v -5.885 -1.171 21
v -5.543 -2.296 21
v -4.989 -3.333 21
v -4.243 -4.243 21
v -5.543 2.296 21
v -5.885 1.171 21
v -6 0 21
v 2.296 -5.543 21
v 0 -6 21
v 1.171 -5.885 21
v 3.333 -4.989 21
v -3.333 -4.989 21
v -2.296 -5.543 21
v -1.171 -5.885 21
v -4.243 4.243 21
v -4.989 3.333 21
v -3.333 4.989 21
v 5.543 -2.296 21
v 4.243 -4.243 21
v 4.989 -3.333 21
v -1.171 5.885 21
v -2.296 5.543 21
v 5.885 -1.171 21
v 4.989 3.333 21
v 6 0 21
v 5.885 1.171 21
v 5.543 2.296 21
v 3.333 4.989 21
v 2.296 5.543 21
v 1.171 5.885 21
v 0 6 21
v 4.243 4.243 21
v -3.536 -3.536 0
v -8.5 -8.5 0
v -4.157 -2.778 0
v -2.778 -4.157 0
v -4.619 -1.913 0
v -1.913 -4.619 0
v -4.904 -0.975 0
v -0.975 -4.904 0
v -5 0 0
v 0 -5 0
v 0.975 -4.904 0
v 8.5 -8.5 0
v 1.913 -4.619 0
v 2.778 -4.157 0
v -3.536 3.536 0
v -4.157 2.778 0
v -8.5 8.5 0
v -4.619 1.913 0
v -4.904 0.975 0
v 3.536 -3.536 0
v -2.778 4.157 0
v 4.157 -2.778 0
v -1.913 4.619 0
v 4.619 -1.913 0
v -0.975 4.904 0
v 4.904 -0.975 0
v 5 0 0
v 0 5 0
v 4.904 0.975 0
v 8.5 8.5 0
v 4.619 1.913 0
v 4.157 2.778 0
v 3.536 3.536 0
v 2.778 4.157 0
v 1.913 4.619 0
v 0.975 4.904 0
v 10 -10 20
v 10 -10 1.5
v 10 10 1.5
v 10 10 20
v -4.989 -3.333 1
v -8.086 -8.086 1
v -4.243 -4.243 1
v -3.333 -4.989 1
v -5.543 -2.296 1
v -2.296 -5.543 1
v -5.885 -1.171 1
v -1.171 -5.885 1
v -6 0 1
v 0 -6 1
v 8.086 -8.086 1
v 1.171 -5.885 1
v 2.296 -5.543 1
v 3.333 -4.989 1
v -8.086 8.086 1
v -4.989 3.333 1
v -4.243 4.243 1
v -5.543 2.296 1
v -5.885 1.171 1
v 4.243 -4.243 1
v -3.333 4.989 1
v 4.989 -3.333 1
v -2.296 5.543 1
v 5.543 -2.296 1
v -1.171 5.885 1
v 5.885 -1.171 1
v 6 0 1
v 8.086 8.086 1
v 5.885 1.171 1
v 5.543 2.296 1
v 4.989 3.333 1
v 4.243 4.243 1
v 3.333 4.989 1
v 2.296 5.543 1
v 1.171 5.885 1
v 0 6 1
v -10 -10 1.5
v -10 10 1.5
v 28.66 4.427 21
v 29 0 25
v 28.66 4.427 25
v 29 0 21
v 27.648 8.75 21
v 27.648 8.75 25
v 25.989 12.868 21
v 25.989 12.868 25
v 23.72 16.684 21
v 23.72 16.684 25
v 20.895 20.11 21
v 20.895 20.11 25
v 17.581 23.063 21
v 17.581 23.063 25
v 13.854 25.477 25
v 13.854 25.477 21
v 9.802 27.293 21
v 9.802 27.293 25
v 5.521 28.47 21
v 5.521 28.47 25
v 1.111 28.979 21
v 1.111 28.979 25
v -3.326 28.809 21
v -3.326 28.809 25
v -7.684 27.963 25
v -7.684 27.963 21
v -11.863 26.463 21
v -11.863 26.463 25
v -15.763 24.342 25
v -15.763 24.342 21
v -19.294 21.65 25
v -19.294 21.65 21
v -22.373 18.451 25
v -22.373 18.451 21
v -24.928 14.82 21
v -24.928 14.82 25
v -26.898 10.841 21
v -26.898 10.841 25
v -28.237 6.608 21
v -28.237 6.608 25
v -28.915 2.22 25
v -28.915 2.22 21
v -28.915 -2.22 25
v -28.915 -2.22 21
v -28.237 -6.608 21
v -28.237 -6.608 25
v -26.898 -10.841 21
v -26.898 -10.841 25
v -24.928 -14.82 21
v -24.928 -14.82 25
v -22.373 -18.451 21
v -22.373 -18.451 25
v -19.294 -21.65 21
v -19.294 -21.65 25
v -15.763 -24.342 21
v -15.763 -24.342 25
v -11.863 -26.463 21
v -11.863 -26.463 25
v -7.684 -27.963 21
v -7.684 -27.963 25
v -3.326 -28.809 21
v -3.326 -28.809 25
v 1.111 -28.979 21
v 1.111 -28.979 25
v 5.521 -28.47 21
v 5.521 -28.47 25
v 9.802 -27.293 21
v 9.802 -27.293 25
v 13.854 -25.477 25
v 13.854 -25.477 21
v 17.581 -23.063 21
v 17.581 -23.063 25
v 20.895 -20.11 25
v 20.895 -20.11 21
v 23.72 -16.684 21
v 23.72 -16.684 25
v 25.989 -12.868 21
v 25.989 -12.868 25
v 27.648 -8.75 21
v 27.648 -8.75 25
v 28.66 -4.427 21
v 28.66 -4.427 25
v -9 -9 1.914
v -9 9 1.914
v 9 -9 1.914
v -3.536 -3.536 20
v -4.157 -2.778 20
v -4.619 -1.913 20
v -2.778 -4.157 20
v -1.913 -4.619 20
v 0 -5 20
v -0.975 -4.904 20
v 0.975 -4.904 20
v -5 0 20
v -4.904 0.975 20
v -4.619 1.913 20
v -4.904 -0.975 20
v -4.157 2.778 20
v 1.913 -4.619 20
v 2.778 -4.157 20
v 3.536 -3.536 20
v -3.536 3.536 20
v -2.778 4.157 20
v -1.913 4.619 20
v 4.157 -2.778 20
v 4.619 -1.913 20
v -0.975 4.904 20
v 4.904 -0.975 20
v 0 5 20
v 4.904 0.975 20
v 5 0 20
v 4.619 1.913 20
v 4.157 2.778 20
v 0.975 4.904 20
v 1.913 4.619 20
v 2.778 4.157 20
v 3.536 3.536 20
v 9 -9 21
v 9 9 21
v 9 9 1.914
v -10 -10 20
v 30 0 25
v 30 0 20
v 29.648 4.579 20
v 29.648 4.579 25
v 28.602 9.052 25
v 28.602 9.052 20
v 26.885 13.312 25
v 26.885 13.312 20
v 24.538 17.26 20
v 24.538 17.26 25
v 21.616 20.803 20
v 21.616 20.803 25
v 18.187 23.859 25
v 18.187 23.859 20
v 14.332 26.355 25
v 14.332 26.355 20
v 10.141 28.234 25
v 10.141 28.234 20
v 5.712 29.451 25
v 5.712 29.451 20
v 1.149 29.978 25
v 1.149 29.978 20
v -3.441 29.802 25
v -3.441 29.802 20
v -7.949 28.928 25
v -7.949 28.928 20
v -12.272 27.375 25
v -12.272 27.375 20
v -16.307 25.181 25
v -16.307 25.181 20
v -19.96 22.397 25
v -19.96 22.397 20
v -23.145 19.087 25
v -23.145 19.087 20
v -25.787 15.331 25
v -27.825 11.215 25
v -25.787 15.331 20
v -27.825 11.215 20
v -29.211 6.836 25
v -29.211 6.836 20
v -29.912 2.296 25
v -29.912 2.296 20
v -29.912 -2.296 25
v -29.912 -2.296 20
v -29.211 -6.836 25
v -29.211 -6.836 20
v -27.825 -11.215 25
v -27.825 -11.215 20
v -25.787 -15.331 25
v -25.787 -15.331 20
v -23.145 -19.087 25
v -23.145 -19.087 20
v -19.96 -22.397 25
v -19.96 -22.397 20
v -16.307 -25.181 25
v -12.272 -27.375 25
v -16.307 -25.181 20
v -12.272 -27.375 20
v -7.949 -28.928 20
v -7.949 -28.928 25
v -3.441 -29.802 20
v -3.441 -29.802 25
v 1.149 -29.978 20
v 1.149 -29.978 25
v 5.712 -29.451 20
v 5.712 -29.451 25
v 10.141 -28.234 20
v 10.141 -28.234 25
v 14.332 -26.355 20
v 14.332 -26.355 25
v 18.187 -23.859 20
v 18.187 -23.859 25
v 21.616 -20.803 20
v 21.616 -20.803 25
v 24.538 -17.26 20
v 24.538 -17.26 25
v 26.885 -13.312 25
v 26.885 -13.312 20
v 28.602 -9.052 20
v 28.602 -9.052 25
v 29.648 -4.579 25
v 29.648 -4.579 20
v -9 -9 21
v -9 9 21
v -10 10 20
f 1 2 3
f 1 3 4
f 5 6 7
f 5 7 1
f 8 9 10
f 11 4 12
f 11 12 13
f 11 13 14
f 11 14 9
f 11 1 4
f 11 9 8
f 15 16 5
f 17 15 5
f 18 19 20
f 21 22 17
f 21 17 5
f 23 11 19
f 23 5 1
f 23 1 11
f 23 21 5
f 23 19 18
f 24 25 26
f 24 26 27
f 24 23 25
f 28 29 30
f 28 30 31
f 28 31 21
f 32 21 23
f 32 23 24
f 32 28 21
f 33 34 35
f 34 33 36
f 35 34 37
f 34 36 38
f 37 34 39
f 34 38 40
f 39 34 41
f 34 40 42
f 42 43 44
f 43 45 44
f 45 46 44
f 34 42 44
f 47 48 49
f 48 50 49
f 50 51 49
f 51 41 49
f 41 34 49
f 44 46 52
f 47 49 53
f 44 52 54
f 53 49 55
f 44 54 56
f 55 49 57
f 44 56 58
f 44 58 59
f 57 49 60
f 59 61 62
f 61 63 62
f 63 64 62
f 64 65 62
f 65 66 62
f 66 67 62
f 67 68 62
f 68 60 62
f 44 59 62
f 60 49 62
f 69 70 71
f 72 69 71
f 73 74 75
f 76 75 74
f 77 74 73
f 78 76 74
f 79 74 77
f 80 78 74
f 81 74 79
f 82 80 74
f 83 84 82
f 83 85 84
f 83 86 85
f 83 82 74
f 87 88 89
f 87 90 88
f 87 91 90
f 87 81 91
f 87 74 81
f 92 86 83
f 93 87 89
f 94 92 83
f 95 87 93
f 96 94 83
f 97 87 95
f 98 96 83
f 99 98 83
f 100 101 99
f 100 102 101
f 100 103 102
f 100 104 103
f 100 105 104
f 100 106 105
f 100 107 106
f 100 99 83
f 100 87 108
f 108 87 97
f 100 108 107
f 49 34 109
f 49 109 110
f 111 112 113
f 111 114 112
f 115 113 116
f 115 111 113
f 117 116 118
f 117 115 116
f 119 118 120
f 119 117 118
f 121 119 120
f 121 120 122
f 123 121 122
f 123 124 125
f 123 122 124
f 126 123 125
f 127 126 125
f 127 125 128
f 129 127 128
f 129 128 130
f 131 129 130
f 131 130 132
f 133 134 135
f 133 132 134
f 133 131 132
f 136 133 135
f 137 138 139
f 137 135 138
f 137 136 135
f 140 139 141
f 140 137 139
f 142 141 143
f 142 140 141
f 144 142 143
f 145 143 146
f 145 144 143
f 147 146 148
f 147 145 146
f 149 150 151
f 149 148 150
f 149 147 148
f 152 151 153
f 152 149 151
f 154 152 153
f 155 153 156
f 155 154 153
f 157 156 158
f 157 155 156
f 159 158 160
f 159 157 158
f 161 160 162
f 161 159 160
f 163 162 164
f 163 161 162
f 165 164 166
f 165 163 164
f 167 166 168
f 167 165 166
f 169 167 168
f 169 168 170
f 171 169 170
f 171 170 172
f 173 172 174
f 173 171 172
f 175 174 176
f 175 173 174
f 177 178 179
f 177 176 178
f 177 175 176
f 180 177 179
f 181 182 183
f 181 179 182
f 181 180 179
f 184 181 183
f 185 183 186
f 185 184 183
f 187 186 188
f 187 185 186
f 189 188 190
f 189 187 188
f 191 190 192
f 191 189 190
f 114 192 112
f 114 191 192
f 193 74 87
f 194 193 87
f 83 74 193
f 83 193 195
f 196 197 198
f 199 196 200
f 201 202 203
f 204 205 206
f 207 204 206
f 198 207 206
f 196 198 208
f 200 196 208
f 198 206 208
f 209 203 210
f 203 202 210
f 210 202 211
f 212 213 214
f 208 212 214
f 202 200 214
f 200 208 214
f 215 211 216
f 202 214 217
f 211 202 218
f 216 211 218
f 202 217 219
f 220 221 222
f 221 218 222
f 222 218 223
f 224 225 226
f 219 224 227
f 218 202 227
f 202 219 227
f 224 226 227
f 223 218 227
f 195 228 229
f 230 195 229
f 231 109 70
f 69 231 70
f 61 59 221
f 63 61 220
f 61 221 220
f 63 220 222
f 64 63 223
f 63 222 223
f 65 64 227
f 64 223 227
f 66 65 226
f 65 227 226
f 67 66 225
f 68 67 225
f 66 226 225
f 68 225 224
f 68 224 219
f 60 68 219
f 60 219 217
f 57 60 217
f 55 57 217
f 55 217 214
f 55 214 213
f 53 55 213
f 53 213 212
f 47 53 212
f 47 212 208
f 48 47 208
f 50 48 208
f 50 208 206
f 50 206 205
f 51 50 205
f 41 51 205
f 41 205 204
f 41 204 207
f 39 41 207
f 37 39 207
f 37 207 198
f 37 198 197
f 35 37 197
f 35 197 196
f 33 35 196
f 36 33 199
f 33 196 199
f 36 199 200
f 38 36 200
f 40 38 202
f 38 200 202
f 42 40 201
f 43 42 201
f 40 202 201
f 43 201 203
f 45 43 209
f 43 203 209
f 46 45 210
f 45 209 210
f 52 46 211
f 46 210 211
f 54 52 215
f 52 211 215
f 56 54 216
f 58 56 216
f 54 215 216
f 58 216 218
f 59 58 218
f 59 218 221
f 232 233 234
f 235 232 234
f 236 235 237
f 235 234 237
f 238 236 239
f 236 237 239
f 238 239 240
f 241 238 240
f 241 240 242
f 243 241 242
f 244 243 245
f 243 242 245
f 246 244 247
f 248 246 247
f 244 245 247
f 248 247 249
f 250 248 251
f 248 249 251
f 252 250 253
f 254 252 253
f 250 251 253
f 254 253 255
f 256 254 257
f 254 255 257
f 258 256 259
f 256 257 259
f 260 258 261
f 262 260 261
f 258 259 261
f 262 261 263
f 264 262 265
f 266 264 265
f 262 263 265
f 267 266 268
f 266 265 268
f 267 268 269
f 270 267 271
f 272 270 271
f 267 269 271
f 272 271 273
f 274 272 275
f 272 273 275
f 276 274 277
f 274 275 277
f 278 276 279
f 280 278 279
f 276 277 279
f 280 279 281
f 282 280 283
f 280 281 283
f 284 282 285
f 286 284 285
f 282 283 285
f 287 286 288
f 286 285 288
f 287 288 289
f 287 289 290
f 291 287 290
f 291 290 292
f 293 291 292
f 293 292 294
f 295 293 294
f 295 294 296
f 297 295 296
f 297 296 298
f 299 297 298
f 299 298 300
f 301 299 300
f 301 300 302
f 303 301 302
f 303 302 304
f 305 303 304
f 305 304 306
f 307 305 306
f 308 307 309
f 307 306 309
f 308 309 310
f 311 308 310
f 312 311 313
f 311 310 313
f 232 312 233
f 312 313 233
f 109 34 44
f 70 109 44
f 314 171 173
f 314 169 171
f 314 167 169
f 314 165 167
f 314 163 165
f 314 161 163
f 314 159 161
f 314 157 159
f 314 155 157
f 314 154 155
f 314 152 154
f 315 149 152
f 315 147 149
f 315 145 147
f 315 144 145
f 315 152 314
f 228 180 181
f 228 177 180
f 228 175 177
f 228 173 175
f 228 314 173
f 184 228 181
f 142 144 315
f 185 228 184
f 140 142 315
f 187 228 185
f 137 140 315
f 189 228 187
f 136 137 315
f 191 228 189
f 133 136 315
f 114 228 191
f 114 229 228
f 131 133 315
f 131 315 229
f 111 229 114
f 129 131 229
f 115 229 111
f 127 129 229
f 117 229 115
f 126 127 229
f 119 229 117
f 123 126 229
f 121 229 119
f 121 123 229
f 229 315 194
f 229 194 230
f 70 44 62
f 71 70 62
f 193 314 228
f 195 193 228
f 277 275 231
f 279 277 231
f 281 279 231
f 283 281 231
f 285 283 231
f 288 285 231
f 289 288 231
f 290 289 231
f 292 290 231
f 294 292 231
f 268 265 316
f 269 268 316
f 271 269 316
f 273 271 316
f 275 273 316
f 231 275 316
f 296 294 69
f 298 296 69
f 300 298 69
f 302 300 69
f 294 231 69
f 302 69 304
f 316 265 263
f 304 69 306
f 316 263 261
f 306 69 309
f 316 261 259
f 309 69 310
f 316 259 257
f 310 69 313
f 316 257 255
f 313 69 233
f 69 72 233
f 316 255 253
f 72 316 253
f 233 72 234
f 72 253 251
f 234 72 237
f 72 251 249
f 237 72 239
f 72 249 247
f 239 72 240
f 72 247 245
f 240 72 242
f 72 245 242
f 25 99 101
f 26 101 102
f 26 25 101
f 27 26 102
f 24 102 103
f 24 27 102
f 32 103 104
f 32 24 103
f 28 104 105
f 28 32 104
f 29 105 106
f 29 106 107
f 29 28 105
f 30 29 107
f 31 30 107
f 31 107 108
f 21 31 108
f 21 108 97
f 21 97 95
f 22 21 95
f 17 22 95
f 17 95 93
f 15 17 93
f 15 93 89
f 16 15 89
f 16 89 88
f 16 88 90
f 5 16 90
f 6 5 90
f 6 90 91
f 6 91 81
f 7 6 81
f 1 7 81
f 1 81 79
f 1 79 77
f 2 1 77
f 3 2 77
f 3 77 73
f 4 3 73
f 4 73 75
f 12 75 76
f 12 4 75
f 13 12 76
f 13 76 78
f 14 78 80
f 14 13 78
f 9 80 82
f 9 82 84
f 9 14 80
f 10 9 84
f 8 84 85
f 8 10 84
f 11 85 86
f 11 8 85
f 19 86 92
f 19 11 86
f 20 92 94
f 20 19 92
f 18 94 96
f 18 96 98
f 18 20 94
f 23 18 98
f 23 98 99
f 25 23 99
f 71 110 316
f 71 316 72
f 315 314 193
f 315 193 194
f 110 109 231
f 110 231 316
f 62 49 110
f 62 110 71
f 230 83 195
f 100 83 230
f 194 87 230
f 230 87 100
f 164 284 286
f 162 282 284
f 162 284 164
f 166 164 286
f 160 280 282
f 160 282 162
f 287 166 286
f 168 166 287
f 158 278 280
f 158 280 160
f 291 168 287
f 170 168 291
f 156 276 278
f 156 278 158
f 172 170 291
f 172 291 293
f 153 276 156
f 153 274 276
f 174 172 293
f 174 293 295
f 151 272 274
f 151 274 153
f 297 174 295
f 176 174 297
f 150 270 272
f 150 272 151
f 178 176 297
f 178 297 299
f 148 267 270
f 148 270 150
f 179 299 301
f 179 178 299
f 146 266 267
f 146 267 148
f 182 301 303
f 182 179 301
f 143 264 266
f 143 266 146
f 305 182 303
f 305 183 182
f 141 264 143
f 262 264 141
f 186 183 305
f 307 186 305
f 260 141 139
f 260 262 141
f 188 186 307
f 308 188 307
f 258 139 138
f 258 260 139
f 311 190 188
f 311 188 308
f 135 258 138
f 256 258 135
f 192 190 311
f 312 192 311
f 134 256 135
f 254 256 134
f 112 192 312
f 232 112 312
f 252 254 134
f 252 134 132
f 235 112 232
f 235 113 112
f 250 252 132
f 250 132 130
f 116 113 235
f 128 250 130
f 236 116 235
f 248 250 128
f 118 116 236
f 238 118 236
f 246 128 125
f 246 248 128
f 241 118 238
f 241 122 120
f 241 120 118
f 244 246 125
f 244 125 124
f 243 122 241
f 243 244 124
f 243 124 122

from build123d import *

# Parameters (mm, degrees)
F0_W     = 20
F0_H     = 20
F1_DEPTH = 20
F2_R     = 5
F3_DEPTH = 25
F4_R     = 30
F5_DEPTH = 5
F6_SIZE  = 1.5
F7_T     = -1


with BuildPart() as f1:
    # F0 (on Top) → F1 (new body)
    with BuildSketch(Plane.XY):
        Rectangle(F0_W, F0_H)
    extrude(amount=F1_DEPTH)

    # F2 (on face) → F3 (cut)
    with BuildSketch(Plane.XY.offset(20)):
        Circle(F2_R)
    extrude(amount=-F3_DEPTH, mode=Mode.SUBTRACT)

    # F4 (on face) → F5 (join)
    with BuildSketch(Plane.XY.offset(20)):
        Circle(F4_R)
    extrude(amount=F5_DEPTH)

    # F6
    f6_edges = [f1.edges().sort_by_distance(p)[0] for p in [
        (10, 0, 0),
        (0, 10, 0),
        (-10, 0, 0),
        (0, -10, 0),
    ]]
    chamfer(f6_edges, length=F6_SIZE)

    # F7
    f7_openings = [f1.faces().sort_by_distance(p)[0] for p in [
        (0, 0, 25),
    ]]
    offset(amount=F7_T, openings=f7_openings, kind=Kind.INTERSECTION)


solid = f1.part
